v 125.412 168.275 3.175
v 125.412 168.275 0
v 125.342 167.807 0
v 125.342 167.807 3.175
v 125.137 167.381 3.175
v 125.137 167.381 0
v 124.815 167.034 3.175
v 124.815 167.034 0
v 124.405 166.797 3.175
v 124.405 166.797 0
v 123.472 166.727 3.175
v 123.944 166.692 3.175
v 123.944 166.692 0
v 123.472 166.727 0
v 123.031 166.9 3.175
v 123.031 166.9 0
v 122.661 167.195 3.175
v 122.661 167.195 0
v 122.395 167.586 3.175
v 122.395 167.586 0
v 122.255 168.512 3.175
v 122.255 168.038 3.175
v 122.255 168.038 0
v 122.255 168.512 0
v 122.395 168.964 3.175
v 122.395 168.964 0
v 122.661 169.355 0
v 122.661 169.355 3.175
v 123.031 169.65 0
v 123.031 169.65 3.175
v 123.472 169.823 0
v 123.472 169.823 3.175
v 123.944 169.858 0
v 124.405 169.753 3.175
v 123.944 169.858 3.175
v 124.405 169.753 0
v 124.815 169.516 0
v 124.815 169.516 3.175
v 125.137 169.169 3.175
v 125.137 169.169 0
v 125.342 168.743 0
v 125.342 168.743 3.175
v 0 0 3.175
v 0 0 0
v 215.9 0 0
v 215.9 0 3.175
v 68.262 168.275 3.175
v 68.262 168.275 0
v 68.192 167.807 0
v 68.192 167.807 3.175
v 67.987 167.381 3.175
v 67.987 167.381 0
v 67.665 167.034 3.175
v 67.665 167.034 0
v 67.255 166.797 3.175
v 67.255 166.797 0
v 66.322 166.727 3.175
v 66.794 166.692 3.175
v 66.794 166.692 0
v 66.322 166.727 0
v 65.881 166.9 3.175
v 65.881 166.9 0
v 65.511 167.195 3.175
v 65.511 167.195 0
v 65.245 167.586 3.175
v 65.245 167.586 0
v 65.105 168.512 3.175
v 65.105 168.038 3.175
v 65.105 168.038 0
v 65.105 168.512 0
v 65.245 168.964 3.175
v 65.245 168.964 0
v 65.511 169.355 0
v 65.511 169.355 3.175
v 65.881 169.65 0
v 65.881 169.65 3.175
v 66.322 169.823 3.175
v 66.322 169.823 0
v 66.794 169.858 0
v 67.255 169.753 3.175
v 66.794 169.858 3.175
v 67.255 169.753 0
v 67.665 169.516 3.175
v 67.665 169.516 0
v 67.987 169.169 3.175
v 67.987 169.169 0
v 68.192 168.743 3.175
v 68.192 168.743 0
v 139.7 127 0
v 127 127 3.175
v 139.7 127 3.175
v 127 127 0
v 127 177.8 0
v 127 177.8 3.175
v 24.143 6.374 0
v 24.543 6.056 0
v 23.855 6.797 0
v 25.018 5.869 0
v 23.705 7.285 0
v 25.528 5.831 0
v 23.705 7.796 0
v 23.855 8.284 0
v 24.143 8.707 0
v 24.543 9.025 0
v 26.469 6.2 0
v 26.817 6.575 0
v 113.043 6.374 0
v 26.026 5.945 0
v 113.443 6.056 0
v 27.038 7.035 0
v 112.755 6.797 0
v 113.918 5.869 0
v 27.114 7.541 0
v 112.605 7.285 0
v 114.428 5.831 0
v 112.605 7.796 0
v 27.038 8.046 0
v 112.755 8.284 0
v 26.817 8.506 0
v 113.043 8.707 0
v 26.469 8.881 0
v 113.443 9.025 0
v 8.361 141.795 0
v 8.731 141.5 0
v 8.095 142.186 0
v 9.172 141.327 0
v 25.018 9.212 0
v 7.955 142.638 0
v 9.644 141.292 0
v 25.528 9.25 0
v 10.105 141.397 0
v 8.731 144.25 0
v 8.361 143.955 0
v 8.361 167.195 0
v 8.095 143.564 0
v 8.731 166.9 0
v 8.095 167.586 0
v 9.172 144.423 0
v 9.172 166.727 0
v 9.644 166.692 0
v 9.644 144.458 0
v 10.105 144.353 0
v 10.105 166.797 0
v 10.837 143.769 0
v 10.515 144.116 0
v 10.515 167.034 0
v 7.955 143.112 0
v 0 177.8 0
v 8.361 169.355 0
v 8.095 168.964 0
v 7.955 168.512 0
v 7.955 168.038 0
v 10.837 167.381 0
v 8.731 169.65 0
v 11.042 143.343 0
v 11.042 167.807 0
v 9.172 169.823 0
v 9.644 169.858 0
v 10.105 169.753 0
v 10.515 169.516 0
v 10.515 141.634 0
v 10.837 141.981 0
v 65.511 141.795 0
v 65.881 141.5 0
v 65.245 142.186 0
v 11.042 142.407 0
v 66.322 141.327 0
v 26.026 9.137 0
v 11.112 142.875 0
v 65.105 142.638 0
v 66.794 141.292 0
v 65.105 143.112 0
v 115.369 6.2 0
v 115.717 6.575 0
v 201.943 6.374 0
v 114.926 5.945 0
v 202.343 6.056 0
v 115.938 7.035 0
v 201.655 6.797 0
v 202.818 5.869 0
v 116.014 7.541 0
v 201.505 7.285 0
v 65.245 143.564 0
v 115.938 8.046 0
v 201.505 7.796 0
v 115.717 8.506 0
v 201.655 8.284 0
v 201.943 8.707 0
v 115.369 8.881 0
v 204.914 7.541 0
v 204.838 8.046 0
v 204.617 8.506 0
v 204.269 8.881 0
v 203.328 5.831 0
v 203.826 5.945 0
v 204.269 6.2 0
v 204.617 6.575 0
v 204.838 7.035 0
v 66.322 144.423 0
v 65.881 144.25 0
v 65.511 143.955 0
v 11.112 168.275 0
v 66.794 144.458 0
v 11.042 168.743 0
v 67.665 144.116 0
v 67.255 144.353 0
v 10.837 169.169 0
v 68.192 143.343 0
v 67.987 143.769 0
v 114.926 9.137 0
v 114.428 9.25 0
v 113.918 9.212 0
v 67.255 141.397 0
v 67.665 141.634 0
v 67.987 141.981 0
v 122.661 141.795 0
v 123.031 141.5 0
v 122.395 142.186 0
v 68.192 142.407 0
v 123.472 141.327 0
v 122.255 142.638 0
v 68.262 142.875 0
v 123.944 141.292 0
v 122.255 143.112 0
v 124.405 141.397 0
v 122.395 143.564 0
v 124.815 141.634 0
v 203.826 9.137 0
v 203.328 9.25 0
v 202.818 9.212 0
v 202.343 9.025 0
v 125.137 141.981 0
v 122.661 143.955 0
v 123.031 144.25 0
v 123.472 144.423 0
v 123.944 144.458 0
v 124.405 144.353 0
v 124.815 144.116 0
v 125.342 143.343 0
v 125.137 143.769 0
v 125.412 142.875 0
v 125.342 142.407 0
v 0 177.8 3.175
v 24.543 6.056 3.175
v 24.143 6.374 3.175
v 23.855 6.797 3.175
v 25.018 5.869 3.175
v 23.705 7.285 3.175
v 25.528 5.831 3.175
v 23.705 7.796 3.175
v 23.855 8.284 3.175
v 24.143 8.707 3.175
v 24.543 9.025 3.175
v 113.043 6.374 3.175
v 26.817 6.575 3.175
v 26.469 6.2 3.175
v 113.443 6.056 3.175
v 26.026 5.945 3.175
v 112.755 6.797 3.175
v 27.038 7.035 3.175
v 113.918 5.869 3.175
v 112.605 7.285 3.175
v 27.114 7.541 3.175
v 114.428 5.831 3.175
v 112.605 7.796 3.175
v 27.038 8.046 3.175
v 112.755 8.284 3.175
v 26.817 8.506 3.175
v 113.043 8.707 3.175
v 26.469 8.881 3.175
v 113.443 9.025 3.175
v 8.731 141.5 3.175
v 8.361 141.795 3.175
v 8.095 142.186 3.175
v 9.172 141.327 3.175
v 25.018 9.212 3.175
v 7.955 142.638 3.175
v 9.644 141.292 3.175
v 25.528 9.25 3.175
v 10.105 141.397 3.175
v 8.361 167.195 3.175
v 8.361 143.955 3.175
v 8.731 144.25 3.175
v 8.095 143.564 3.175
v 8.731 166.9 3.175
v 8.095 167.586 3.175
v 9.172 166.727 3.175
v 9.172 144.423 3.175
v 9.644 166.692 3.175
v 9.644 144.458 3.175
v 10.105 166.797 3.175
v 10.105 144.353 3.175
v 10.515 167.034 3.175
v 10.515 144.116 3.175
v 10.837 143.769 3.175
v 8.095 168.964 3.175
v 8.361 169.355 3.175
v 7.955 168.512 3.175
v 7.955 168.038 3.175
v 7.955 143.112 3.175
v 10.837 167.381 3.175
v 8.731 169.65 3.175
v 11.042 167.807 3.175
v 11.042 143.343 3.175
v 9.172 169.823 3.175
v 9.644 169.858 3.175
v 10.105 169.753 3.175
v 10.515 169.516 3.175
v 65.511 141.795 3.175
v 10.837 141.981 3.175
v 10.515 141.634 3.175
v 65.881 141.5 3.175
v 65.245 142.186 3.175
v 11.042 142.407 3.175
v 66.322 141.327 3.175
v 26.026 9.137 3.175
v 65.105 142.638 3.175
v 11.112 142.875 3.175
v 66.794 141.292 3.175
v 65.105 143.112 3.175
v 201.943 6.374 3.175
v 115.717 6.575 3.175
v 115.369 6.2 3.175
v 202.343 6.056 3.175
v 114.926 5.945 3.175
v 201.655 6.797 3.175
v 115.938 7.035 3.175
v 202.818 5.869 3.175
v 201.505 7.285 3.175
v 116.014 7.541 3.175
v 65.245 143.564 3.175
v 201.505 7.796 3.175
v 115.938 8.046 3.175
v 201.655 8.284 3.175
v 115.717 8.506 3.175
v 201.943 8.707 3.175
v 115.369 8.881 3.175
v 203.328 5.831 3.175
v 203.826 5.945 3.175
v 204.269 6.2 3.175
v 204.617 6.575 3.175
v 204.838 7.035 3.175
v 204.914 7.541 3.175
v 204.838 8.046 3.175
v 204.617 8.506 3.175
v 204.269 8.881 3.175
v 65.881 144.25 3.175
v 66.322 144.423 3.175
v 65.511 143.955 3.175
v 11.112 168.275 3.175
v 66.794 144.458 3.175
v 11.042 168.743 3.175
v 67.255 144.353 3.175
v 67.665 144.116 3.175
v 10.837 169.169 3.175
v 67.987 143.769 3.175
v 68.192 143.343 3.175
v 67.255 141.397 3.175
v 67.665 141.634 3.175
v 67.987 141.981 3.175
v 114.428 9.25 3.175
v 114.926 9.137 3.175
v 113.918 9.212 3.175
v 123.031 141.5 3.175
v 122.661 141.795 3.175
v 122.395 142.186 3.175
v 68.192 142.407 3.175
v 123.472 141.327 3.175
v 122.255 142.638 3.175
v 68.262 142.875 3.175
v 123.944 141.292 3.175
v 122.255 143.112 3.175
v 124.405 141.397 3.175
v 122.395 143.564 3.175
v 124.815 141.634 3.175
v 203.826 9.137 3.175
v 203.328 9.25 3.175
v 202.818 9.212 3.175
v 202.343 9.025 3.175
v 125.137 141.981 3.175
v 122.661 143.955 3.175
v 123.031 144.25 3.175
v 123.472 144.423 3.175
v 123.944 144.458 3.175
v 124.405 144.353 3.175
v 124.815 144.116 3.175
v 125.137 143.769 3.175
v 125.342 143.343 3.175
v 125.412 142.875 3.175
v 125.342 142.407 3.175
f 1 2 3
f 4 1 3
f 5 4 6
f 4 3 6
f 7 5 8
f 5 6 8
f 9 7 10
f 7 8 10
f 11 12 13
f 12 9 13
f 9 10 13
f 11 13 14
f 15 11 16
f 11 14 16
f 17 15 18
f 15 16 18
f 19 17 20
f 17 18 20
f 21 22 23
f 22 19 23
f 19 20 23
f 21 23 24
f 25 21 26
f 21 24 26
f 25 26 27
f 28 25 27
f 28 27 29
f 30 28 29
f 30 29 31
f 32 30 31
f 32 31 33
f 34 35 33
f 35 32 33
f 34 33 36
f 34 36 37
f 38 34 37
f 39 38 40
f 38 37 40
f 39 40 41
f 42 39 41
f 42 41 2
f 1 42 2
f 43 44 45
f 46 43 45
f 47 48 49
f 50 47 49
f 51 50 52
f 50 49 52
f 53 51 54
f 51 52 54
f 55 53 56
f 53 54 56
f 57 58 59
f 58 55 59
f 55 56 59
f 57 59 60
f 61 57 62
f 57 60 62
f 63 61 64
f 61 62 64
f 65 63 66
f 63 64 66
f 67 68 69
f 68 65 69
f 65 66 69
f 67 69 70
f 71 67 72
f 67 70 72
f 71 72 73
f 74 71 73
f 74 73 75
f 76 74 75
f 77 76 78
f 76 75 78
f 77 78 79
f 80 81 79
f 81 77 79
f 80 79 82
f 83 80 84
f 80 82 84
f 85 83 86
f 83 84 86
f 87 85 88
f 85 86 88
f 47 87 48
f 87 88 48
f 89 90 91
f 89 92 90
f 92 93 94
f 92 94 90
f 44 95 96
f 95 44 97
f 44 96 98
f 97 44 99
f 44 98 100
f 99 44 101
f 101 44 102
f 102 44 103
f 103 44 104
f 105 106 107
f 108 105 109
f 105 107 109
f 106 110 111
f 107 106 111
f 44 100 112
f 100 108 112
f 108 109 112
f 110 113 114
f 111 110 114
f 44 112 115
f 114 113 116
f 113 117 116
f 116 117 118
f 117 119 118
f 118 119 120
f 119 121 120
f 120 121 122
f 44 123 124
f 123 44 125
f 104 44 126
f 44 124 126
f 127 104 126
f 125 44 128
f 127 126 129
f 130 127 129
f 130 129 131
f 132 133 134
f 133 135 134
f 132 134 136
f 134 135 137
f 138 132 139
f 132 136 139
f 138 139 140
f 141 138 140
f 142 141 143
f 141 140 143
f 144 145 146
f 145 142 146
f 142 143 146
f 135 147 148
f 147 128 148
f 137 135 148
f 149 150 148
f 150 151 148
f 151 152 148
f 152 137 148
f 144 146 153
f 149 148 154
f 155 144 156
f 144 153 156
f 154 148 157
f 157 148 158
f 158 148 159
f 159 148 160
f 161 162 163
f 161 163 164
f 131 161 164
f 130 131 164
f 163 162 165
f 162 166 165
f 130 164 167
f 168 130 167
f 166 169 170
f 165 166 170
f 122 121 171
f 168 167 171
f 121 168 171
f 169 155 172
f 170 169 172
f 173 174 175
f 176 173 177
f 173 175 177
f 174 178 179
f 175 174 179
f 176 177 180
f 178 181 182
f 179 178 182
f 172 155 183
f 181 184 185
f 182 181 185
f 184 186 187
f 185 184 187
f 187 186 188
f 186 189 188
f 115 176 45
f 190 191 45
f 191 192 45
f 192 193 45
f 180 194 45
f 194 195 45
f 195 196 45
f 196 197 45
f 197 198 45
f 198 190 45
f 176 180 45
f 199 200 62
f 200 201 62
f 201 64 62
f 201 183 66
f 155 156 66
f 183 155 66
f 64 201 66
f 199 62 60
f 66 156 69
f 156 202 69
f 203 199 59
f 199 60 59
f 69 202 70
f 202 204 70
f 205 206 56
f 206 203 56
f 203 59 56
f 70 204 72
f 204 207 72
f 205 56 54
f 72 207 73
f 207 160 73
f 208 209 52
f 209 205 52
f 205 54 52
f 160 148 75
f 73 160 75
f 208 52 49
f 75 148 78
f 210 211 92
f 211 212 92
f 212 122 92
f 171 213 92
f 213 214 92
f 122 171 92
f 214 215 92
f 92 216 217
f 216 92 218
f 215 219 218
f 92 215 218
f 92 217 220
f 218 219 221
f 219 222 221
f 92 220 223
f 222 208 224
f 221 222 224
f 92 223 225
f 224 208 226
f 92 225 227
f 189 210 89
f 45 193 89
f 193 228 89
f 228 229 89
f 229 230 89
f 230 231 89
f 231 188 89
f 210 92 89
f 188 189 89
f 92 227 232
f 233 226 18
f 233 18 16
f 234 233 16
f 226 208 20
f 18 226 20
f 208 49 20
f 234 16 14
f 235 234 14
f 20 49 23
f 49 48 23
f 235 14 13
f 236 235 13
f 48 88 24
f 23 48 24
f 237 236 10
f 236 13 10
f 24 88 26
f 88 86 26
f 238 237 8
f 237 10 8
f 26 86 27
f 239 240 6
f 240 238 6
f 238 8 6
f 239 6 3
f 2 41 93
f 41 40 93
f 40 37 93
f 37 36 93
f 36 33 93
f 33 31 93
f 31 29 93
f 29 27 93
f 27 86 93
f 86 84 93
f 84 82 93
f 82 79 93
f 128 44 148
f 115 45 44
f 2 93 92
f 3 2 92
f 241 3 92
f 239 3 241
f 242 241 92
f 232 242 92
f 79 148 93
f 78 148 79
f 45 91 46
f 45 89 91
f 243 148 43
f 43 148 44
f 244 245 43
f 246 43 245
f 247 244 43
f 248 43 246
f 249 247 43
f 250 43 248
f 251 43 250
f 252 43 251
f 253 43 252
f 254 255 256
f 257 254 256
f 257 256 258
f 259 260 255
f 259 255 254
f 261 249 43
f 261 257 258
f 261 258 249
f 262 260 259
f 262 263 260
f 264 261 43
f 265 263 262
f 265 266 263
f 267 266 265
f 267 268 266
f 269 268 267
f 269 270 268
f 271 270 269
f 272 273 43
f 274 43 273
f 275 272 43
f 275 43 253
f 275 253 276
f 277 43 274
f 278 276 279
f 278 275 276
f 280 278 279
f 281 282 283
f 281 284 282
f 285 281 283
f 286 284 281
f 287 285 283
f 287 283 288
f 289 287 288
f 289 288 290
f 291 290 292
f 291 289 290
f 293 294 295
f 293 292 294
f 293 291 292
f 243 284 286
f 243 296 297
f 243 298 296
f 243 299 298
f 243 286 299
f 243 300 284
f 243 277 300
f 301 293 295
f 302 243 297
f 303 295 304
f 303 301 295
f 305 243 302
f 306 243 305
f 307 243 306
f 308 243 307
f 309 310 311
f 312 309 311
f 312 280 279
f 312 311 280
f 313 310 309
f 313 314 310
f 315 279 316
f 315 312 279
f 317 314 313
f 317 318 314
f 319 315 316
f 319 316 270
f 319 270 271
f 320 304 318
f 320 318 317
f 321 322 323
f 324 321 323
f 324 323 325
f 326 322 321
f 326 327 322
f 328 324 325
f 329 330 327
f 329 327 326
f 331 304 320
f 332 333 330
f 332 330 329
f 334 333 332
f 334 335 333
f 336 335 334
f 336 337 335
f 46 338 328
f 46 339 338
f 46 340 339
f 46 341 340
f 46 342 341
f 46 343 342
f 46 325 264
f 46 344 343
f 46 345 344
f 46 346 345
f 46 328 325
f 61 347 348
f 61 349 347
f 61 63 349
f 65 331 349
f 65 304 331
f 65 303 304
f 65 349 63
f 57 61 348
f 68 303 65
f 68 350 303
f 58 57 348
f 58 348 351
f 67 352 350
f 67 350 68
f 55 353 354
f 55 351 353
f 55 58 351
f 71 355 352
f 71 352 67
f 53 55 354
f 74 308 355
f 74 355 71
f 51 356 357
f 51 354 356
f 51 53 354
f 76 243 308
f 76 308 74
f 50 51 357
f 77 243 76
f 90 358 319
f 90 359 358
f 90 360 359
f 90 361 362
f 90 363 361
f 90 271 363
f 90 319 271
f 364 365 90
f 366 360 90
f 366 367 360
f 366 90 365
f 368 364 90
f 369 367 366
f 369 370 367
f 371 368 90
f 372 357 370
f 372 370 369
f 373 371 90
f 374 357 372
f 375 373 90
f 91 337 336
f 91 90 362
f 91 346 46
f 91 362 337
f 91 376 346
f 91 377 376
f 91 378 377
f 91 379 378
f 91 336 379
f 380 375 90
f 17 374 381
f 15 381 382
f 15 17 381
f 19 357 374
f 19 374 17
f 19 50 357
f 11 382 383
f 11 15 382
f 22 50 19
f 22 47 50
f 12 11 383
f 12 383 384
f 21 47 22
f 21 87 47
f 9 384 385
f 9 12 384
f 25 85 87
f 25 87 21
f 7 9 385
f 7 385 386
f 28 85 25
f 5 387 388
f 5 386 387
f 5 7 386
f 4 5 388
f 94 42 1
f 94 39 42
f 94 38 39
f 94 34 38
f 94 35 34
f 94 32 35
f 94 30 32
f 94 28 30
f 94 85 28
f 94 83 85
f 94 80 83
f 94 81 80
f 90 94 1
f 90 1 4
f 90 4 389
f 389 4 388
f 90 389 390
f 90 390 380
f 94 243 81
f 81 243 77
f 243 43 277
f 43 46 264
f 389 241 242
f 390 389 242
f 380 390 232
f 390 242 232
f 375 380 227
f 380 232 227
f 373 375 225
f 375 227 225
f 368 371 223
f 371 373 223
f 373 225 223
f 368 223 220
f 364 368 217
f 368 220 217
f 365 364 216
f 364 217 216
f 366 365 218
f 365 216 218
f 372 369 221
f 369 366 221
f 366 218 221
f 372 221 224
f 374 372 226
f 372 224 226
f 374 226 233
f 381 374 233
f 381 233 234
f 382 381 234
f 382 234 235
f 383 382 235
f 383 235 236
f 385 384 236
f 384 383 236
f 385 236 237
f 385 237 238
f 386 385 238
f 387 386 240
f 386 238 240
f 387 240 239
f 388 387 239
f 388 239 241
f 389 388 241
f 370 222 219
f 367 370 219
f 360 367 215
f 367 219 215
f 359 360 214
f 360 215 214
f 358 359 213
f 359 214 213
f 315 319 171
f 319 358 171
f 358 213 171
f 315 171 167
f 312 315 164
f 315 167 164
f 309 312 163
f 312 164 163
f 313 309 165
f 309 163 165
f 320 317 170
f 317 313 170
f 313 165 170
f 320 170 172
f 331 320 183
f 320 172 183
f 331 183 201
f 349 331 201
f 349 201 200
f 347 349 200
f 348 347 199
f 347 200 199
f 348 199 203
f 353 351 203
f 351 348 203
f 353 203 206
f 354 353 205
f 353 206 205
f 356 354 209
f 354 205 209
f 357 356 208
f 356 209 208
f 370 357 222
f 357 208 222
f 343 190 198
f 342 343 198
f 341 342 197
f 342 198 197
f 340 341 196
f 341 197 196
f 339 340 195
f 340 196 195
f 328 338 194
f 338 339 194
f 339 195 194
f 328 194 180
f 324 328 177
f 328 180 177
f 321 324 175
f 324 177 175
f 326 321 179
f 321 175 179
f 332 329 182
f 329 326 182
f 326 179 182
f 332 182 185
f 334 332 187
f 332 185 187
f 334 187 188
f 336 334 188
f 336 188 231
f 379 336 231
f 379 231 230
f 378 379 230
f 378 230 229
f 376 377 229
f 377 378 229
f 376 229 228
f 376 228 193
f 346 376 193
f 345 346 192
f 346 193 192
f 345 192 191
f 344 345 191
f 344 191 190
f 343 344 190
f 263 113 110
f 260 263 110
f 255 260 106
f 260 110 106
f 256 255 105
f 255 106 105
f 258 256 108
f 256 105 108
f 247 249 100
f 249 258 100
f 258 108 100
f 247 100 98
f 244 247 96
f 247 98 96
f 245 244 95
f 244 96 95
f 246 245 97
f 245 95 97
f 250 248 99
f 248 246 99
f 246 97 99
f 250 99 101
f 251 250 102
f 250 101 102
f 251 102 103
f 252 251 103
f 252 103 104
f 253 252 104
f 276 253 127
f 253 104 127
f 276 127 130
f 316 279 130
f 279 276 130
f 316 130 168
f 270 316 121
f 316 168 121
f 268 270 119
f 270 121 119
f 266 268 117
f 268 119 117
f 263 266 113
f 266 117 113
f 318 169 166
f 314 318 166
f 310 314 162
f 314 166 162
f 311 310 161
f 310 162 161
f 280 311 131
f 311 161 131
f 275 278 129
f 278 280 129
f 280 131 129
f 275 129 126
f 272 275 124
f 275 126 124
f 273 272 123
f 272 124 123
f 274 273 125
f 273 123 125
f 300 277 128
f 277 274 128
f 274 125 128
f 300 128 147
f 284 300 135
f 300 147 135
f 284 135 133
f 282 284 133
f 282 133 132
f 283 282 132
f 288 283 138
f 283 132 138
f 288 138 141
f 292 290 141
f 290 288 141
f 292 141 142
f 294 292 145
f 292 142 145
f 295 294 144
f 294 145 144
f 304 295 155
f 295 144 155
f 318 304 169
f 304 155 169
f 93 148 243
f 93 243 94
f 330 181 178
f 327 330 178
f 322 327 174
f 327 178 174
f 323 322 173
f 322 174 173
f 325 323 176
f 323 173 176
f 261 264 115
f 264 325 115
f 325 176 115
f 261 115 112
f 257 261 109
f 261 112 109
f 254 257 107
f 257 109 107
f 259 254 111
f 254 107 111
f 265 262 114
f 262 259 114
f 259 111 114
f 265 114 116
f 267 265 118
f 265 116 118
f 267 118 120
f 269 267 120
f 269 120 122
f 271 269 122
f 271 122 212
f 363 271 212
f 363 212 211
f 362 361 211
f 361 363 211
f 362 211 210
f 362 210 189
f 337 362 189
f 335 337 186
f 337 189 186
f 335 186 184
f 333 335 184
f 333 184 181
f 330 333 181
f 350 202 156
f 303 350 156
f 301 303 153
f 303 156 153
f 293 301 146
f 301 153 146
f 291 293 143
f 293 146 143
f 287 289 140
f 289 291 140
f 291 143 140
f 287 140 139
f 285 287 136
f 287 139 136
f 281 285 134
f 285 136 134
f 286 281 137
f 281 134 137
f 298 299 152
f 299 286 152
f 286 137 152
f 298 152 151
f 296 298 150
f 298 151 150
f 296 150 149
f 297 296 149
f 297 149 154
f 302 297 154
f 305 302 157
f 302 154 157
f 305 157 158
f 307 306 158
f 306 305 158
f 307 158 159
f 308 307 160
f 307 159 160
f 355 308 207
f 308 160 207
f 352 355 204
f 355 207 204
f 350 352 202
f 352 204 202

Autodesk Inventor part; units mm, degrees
ref_plane "YZ Plane" through (0, 0, 0) normal (1, 0, 0) x (0, 1, 0)
ref_plane "XZ Plane" through (0, 0, 0) normal (0, 1, 0) x (-1, 0, 0)
ref_plane "XY Plane" through (0, 0, 0) normal (0, 0, 1) x (1, 0, 0)
sketch "Sketch1" plane through (0, 0, 0) normal (0, 0, 1) x (1, 0, 0)
  line L0 (0, 177.8) -> (0, 0)
  line L1 (0, 0) -> (215.9, 0)
  line L2 (0, 177.8) -> (127, 177.8)
  line L3 (127, 177.8) -> (127, 127)
  circle A0 centre (9.525, 168.275) radius 1.5875
  circle A1 centre (66.675, 168.275) radius 1.5875
  circle A2 centre (123.825, 168.275) radius 1.5875
  circle A3 centre (9.525, 142.875) radius 1.5875
  circle A4 centre (66.675, 142.875) radius 1.5875
  circle A5 centre (123.825, 142.875) radius 1.5875
  line L4 (127, 127) -> (139.7, 127)
  line L5 (139.7, 127) -> (215.9, 0)
  circle A6 centre (114.3, 7.5406) radius 1.7145 projected
  circle A7 centre (25.4, 7.5406) radius 1.7145 projected
  circle A8 centre (203.2, 7.5406) radius 1.7145 projected
  line L6 (0, -0.7937) -> (0, 15.0812) construction
  line L7 (0, -0.7937) -> (215.9, -0.7938) construction
  line L8 (215.9, 15.0812) -> (215.9, -0.7938) construction
  line L9 (0, 15.0812) -> (215.9, 15.0812) construction
  dimension "d0" = 177.8
  dimension "d1" = 215.9
  dimension "d2" = 127
  dimension "d3" = 50.8
  dimension "d7" = 3.175
  dimension "d10" = 57.15
  dimension "d13" = 25.4
  dimension "d16" = 9.525
  dimension "d17" = 9.525
  dimension "d18" = 12.7
extrude "Extrusion1" add sketch "Sketch1" along normal blind 3.175
properties part number "Hopper Right Side Leg" material "Polycarbonate, Clear"
